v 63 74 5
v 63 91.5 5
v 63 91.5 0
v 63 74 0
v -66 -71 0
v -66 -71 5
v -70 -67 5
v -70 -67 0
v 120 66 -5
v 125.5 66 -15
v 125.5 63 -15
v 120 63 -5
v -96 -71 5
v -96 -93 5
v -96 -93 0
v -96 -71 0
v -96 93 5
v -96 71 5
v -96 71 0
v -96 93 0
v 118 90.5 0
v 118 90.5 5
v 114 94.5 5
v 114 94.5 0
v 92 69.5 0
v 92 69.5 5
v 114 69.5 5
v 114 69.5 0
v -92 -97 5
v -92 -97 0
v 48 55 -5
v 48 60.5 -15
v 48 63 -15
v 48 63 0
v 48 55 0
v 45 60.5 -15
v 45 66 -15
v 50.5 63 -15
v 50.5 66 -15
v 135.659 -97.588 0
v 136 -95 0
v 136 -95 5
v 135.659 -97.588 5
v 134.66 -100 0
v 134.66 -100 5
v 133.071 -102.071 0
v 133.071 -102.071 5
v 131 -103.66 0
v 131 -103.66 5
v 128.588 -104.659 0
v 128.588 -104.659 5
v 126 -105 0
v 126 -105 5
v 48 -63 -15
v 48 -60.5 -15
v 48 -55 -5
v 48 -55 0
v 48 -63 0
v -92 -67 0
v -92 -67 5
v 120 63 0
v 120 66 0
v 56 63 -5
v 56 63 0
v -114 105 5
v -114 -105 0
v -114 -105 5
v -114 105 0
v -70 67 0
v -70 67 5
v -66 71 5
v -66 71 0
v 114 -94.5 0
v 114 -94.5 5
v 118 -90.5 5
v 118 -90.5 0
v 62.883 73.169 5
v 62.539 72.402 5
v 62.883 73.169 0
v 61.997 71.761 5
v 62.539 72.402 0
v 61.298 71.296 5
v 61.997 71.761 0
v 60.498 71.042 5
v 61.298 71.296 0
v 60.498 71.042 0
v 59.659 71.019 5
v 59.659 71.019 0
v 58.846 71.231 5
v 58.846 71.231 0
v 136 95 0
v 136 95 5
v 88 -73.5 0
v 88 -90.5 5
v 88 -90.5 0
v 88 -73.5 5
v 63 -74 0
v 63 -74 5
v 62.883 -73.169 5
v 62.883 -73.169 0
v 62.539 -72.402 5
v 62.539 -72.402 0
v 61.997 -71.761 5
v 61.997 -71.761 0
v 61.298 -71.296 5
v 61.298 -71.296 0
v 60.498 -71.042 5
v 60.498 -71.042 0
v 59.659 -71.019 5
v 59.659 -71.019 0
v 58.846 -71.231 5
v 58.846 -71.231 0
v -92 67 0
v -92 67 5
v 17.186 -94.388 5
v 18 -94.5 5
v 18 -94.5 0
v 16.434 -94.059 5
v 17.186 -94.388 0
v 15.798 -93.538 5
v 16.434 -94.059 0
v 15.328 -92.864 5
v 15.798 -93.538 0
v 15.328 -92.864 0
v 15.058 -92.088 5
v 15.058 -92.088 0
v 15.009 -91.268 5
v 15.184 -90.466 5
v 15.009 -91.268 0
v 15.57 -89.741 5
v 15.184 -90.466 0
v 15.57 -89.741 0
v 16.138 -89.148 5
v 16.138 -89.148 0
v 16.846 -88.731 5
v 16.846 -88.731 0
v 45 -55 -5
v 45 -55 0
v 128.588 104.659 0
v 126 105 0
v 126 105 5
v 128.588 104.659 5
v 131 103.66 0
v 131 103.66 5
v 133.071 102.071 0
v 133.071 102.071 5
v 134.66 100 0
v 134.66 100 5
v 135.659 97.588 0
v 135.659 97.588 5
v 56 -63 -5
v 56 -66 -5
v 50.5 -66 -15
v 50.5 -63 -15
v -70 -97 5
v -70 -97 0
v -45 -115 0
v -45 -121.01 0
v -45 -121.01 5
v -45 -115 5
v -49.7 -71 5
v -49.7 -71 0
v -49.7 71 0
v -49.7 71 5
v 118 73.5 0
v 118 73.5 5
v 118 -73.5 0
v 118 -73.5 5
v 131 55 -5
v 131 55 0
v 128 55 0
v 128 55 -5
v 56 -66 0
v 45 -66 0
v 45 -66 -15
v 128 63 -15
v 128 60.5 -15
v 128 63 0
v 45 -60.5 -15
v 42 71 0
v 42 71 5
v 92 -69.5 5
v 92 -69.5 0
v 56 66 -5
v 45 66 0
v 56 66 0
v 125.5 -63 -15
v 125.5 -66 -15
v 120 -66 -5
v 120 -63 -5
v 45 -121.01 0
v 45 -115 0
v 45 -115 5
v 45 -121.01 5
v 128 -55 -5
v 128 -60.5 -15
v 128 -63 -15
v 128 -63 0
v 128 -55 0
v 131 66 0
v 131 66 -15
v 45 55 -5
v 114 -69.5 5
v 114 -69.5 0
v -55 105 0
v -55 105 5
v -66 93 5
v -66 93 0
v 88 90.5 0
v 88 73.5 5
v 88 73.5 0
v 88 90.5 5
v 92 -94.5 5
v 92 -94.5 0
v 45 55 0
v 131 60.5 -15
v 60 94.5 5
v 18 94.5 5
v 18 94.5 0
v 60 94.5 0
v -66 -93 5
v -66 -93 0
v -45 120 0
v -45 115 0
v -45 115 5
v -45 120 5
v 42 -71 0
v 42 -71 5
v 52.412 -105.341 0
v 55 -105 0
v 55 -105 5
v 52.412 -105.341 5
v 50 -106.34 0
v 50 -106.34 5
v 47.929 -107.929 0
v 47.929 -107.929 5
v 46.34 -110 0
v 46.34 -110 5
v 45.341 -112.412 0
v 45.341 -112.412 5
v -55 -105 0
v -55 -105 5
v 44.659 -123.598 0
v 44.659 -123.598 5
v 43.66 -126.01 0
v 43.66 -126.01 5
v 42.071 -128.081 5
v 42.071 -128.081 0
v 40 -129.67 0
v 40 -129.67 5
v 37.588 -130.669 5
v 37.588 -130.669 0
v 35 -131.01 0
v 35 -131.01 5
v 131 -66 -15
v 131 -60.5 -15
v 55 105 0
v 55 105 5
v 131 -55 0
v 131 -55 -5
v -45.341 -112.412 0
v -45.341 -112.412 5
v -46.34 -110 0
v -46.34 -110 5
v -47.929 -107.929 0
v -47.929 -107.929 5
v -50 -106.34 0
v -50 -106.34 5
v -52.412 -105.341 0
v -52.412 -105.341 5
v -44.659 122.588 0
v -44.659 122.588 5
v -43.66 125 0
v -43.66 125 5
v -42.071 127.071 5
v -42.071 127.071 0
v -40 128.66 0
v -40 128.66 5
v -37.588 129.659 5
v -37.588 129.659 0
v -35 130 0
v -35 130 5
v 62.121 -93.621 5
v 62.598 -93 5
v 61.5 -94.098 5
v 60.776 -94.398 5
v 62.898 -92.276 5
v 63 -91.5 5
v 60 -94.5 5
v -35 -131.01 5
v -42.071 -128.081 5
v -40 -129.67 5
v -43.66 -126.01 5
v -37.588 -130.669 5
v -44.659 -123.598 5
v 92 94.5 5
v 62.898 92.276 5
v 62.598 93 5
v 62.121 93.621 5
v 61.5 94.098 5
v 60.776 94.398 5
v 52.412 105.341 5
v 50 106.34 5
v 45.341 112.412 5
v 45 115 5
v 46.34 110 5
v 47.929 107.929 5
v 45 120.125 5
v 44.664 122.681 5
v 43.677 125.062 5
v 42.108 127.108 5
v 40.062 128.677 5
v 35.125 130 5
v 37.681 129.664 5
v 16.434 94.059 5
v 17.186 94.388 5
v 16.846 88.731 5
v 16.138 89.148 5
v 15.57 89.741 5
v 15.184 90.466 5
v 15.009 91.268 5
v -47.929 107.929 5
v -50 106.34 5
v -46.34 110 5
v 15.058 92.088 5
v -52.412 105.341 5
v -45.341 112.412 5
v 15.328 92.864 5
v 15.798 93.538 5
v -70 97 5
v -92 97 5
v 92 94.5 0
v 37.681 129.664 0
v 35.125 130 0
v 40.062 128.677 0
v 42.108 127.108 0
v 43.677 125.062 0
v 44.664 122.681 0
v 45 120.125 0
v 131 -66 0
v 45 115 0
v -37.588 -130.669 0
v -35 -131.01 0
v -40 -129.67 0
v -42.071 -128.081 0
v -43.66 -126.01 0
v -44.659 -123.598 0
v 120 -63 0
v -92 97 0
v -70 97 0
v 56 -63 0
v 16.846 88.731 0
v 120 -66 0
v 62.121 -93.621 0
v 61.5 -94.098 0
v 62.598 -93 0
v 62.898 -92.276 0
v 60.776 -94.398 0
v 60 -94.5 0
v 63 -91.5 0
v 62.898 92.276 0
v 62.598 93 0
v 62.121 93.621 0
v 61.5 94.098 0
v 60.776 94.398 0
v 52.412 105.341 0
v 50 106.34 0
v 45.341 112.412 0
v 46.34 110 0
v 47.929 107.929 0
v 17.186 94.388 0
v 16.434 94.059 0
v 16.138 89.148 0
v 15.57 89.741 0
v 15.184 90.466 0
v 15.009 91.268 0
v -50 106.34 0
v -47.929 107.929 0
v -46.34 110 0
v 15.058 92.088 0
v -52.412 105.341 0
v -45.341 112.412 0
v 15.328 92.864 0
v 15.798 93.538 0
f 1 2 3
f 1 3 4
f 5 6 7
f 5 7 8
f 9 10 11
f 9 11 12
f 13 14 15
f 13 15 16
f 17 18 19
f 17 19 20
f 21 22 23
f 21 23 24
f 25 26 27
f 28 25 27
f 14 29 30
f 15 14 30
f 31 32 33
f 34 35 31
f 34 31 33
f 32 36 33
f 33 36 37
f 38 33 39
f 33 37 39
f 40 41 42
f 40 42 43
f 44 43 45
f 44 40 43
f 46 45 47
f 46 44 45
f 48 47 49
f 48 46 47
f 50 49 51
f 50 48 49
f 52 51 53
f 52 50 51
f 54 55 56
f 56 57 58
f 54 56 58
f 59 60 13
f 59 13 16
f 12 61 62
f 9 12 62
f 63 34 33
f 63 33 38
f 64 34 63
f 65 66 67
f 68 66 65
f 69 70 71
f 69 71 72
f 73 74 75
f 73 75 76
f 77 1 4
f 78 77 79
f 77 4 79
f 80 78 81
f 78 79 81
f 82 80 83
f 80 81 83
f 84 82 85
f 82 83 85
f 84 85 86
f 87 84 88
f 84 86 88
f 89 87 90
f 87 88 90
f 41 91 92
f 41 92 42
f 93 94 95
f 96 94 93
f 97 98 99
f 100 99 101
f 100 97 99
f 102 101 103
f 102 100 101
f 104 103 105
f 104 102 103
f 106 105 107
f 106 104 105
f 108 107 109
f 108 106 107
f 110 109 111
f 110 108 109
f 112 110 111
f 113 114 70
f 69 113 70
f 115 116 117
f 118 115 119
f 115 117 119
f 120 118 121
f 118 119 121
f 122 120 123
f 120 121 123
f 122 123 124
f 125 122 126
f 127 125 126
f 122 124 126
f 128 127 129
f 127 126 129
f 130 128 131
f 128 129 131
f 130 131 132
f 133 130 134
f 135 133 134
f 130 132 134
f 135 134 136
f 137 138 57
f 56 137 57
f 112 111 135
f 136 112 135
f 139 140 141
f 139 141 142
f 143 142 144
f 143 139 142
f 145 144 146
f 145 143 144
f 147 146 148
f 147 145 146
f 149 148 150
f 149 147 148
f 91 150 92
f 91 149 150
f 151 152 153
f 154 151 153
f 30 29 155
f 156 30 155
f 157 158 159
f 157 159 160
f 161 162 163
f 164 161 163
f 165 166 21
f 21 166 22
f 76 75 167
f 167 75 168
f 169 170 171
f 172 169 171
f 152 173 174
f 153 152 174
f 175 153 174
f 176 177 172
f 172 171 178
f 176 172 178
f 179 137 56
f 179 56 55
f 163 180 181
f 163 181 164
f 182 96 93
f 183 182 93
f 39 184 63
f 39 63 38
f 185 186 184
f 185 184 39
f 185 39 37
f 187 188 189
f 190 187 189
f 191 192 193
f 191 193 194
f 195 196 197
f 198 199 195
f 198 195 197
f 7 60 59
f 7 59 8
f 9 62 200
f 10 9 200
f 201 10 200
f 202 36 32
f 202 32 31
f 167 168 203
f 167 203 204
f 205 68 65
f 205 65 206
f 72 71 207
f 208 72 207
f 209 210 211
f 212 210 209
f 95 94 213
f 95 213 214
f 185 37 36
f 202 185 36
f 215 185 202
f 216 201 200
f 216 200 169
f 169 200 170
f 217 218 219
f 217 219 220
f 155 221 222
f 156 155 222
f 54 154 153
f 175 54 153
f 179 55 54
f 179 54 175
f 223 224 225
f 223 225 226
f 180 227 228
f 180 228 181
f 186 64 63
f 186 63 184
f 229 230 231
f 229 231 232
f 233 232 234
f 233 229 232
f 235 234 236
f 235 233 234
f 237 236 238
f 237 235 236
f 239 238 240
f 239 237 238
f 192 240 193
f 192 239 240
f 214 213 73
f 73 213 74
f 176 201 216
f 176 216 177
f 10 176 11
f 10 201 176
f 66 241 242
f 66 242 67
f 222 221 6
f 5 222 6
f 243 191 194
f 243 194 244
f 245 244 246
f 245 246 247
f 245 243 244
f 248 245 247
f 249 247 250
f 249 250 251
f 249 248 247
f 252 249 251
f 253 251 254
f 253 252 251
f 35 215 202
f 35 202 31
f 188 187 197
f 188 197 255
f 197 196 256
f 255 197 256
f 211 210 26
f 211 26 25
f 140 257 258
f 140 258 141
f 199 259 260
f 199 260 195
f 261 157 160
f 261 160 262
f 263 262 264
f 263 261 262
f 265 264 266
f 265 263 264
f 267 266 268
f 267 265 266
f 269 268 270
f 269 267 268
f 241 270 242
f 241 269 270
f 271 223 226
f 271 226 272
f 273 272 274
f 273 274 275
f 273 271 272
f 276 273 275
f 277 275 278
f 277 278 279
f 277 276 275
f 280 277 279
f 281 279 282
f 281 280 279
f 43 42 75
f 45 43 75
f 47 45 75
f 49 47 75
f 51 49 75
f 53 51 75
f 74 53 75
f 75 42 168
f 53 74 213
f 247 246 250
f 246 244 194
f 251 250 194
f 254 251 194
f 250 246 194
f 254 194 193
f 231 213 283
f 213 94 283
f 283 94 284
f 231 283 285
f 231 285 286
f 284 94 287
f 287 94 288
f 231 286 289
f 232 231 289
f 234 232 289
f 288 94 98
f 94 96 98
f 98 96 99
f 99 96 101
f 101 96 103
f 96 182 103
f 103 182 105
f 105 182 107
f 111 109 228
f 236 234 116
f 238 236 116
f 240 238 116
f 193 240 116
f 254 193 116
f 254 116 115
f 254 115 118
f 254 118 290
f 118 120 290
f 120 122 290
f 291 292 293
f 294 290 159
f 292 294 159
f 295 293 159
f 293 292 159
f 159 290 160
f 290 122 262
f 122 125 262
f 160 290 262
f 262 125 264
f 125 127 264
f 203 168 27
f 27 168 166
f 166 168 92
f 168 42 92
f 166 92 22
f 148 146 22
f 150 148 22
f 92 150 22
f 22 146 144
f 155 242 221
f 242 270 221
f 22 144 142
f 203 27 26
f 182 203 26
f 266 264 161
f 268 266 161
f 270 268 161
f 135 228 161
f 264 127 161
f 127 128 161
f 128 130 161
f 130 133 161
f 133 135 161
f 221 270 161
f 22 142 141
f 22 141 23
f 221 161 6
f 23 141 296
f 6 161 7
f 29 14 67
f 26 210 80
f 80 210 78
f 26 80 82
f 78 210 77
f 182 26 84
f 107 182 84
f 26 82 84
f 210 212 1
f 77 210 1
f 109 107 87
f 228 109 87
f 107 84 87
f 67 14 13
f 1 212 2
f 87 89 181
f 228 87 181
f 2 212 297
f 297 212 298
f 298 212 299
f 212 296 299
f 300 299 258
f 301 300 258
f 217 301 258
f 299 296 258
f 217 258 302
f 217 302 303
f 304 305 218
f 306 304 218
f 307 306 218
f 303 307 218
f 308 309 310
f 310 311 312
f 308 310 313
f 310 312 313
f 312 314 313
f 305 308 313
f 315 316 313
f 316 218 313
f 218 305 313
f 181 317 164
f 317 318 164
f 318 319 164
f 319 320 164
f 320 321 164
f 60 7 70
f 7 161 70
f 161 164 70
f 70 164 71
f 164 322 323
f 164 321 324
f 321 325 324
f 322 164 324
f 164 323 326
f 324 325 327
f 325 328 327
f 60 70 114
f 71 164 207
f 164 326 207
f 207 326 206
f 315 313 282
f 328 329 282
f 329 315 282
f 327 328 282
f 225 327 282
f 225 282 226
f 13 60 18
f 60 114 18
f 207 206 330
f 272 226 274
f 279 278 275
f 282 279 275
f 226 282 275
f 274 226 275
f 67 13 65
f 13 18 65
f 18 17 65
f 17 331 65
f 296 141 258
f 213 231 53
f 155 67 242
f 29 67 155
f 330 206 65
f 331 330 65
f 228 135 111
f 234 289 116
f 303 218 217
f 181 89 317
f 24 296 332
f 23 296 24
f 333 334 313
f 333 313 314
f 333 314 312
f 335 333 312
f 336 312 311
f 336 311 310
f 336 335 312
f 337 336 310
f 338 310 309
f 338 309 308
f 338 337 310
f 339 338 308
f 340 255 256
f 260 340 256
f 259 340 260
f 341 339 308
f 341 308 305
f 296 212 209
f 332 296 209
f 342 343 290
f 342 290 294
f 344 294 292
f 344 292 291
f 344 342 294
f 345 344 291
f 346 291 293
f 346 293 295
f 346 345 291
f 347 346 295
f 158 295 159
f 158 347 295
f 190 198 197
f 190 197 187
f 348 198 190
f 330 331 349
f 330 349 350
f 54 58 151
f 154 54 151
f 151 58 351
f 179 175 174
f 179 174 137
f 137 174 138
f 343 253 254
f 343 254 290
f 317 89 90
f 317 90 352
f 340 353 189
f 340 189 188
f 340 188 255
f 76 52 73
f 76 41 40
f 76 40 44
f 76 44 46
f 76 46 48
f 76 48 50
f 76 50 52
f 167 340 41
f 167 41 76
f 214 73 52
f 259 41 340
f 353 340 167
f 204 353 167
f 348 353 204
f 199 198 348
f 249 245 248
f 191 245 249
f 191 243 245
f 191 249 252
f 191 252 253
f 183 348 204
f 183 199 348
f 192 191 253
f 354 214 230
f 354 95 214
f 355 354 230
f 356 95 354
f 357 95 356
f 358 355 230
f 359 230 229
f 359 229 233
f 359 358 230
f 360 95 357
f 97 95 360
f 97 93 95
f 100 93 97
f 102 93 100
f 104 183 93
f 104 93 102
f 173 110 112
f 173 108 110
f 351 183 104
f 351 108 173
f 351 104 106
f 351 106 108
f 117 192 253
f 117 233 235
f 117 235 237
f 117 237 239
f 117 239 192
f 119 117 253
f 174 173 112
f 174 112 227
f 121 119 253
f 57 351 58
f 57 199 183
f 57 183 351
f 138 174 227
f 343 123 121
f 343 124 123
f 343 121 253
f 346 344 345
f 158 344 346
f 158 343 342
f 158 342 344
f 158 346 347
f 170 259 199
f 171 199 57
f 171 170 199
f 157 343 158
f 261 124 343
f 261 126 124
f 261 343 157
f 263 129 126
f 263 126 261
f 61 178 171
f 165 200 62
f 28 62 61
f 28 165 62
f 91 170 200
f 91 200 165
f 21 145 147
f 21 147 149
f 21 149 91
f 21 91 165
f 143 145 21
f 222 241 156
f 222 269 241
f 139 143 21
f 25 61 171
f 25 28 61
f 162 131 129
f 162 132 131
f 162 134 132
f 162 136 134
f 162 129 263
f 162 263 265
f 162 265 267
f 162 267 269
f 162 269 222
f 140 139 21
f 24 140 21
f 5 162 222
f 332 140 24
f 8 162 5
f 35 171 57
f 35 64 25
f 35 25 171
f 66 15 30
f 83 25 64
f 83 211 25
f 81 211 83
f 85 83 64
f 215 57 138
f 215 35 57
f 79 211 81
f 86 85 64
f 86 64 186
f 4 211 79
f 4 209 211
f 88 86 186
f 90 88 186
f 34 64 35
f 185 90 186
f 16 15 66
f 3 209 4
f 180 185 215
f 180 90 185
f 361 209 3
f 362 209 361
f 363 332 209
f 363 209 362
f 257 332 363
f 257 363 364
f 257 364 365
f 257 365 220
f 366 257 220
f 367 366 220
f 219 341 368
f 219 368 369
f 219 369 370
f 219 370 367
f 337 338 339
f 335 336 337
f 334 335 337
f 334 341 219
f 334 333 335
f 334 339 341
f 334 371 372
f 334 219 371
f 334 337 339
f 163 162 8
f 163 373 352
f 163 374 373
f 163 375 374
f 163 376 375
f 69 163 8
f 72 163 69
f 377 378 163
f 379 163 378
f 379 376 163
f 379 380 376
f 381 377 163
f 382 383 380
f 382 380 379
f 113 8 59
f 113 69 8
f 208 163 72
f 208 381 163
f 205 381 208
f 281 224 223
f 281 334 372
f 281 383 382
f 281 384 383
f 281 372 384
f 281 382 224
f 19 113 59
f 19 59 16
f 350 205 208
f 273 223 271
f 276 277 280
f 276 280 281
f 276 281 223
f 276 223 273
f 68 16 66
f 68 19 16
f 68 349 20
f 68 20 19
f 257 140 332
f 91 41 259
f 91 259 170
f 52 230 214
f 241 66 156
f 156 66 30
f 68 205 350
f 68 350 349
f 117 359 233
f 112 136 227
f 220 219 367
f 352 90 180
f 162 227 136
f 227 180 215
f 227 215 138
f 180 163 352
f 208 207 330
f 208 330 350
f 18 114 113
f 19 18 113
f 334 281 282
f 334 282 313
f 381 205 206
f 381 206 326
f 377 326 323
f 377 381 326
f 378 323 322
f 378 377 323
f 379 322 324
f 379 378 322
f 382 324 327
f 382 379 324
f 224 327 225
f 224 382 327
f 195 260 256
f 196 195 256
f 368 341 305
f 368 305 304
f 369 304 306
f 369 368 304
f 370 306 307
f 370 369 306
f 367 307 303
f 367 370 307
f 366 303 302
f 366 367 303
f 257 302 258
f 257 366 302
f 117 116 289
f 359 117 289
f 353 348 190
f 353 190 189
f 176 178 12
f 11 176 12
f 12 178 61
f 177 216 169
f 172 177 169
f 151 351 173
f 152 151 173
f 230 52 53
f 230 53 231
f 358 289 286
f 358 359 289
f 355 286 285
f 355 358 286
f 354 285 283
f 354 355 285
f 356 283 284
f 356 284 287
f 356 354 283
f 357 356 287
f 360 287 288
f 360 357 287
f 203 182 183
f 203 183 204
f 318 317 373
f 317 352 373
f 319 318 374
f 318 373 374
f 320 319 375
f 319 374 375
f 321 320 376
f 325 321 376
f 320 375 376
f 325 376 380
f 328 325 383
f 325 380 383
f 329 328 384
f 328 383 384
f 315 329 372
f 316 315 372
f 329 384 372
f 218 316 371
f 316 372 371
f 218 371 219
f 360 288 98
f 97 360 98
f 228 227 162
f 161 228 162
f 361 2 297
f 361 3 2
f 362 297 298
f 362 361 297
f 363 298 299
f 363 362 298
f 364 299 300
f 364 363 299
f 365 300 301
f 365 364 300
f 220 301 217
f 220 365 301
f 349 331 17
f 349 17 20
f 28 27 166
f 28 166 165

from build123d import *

# Parameters (mm, degrees)
EXTRUDE_1_DEPTH     = 5
SKETCH_2_W          = 30
SKETCH_2_H          = 30
SKETCH_2_H_2        = 25
CUT_EXTRUDE_1_DEPTH = 189.903823128
CHAMFER_1_SIZE      = 4
EXTRUDE_2_DEPTH     = 15
CUT_EXTRUDE_2_DEPTH = 3
CUT_EXTRUDE_3_DEPTH = 3
CUT_EXTRUDE_4_DEPTH = 3
CUT_EXTRUDE_5_DEPTH = 3
FILLET_1_R          = 3
SKETCH_8_W          = 91.7
SKETCH_8_H          = 142
CUT_EXTRUDE_6_DEPTH = 5


with BuildPart() as part:
    # 草图1 → 凸台-拉伸1 (new body)
    with BuildSketch(Plane.XY):
        with BuildLine():
            Line((-45, 115), (-45, 120))
            ThreePointArc((-45, 120), (-42.071067812, 127.071067812), (-35, 130))
            Line((-35, 130), (35.124730195, 130))
            ThreePointArc((35.124730195, 130), (42.10760044, 127.10760044), (45, 120.124730195))
            Line((45, 120.124730195), (45, 115))
            ThreePointArc((45, 115), (47.928932188, 107.928932188), (55, 105))
            Line((55, 105), (126, 105))
            ThreePointArc((126, 105), (133.071067812, 102.071067812), (136, 95))
            Line((136, 95), (136, -95))
            ThreePointArc((136, -95), (133.071067812, -102.071067812), (126, -105))
            Line((126, -105), (115, -105))
            Line((115, -105), (55, -105))
            ThreePointArc((55, -105), (47.928932188, -107.928932188), (45, -115))
            Line((45, -115), (45, -121.010130877))
            ThreePointArc((45, -121.010130877), (42.071067812, -128.081198689), (35, -131.010130877))
            Line((35, -131.010130877), (-35, -131.010130877))
            ThreePointArc((-35, -131.010130877), (-42.071067812, -128.081198689), (-45, -121.010130877))
            Line((-45, -121.010130877), (-45, -115))
            ThreePointArc((-45, -115), (-47.928932188, -107.928932188), (-55, -105))
            Line((-55, -105), (-114, -105))
            Line((-114, -105), (-114, -95))
            Line((-114, -95), (-114, 95))
            Line((-114, 95), (-114, 105))
            Line((-114, 105), (-55, 105))
            ThreePointArc((-55, 105), (-47.928932188, 107.928932188), (-45, 115))
        make_face()
    extrude(amount=EXTRUDE_1_DEPTH)

    # 草图2 → 切除-拉伸1 (cut, through all)
    with BuildSketch(Plane.XY.offset(5)):
        with Locations((-81, 82)):
            Rectangle(SKETCH_2_W, SKETCH_2_H)
        with Locations((-81, -82)):
            Rectangle(SKETCH_2_W, SKETCH_2_H)
        with Locations((103, 82)):
            Rectangle(SKETCH_2_W, SKETCH_2_H_2)
        with Locations((103, -82)):
            Rectangle(SKETCH_2_W, SKETCH_2_H_2)
        Polygon((3, 94.5), (63, 94.5), (63, 69.5), align=None)
        Polygon((3, -94.5), (63, -94.5), (63, -69.5), align=None)
    extrude(amount=-CUT_EXTRUDE_1_DEPTH, mode=Mode.SUBTRACT)

    # 倒角1
    chamfer_1_edges = [part.edges().sort_by_distance(p)[0] for p in [
        (118, -69.5, 2.5),
        (118, -94.5, 2.5),
        (88, -94.5, 2.5),
        (88, -69.5, 2.5),
        (118, 94.5, 2.5),
        (118, 69.5, 2.5),
        (88, 69.5, 2.5),
        (88, 94.5, 2.5),
        (-66, -67, 2.5),
        (-66, -97, 2.5),
        (-96, -97, 2.5),
        (-96, -67, 2.5),
        (-66, 97, 2.5),
        (-66, 67, 2.5),
        (-96, 67, 2.5),
        (-96, 97, 2.5),
    ]]
    chamfer(chamfer_1_edges, length=CHAMFER_1_SIZE)

    # 草图3 → 凸台-拉伸2 (add)
    with BuildSketch(Plane(origin=(0, 0, 0), x_dir=(-1, 0, 0), z_dir=(0, 0, -1))):
        Polygon((-131, 66), (-131, 55), (-128, 55), (-128, 63), (-120, 63), (-120, 66), align=None)
        Polygon((-56, 63), (-56, 66), (-45, 66), (-45, 55), (-48, 55), (-48, 63), align=None)
        Polygon((-48, -63), (-56, -63), (-56, -66), (-45, -66), (-45, -55), (-48, -55), align=None)
        Polygon((-120, -63), (-120, -66), (-131, -66), (-131, -55), (-128, -55), (-128, -63), align=None)
    extrude(amount=EXTRUDE_2_DEPTH)

    # 草图4 → 切除-拉伸2 (cut)
    with BuildSketch(Plane(origin=(131, 0, 0), x_dir=(0, 0, -1), z_dir=(1, 0, 0))):
        Polygon((15, 60.5), (5, 55), (15, 55), align=None)
        Polygon((15, -60.5), (15, -55), (5, -55), align=None)
    extrude(amount=-CUT_EXTRUDE_2_DEPTH, mode=Mode.SUBTRACT)

    # 草图5 → 切除-拉伸3 (cut)
    with BuildSketch(Plane(origin=(0, 66, 0), x_dir=(1, 0, 0), z_dir=(0, 1, 0))):
        Polygon((50.5, 15), (56, 15), (56, 5), align=None)
        Polygon((120, 15), (125.5, 15), (120, 5), align=None)
    extrude(amount=-CUT_EXTRUDE_3_DEPTH, mode=Mode.SUBTRACT)

    # 草图6 → 切除-拉伸4 (cut)
    with BuildSketch(Plane.ZY.offset(-45)):
        Polygon((-15, 60.5), (-5, 55), (-15, 55), align=None)
        Polygon((-15, -60.5), (-15, -55), (-5, -55), align=None)
    extrude(amount=-CUT_EXTRUDE_4_DEPTH, mode=Mode.SUBTRACT)

    # 草图7 → 切除-拉伸5 (cut)
    with BuildSketch(Plane.XZ.offset(66)):
        Polygon((50.5, -15), (56, -15), (56, -5), align=None)
        Polygon((120, -15), (125.5, -15), (120, -5), align=None)
    extrude(amount=-CUT_EXTRUDE_5_DEPTH, mode=Mode.SUBTRACT)

    # 圆角1
    fillet_1_edges = [part.edges().sort_by_distance(p)[0] for p in [
        (63, -69.5, 2.5),
        (63, -94.5, 2.5),
        (3, -94.5, 2.5),
        (63, 69.5, 2.5),
        (3, 94.5, 2.5),
        (63, 94.5, 2.5),
    ]]
    fillet(fillet_1_edges, radius=FILLET_1_R)

    # 草图8 → 切除-拉伸6 (cut)
    with BuildSketch(Plane(origin=(0, 0, 0), x_dir=(-1, 0, 0), z_dir=(0, 0, -1))):
        with Locations((3.85, 0)):
            Rectangle(SKETCH_8_W, SKETCH_8_H)
    extrude(amount=-CUT_EXTRUDE_6_DEPTH, mode=Mode.SUBTRACT)


solid = part.part
